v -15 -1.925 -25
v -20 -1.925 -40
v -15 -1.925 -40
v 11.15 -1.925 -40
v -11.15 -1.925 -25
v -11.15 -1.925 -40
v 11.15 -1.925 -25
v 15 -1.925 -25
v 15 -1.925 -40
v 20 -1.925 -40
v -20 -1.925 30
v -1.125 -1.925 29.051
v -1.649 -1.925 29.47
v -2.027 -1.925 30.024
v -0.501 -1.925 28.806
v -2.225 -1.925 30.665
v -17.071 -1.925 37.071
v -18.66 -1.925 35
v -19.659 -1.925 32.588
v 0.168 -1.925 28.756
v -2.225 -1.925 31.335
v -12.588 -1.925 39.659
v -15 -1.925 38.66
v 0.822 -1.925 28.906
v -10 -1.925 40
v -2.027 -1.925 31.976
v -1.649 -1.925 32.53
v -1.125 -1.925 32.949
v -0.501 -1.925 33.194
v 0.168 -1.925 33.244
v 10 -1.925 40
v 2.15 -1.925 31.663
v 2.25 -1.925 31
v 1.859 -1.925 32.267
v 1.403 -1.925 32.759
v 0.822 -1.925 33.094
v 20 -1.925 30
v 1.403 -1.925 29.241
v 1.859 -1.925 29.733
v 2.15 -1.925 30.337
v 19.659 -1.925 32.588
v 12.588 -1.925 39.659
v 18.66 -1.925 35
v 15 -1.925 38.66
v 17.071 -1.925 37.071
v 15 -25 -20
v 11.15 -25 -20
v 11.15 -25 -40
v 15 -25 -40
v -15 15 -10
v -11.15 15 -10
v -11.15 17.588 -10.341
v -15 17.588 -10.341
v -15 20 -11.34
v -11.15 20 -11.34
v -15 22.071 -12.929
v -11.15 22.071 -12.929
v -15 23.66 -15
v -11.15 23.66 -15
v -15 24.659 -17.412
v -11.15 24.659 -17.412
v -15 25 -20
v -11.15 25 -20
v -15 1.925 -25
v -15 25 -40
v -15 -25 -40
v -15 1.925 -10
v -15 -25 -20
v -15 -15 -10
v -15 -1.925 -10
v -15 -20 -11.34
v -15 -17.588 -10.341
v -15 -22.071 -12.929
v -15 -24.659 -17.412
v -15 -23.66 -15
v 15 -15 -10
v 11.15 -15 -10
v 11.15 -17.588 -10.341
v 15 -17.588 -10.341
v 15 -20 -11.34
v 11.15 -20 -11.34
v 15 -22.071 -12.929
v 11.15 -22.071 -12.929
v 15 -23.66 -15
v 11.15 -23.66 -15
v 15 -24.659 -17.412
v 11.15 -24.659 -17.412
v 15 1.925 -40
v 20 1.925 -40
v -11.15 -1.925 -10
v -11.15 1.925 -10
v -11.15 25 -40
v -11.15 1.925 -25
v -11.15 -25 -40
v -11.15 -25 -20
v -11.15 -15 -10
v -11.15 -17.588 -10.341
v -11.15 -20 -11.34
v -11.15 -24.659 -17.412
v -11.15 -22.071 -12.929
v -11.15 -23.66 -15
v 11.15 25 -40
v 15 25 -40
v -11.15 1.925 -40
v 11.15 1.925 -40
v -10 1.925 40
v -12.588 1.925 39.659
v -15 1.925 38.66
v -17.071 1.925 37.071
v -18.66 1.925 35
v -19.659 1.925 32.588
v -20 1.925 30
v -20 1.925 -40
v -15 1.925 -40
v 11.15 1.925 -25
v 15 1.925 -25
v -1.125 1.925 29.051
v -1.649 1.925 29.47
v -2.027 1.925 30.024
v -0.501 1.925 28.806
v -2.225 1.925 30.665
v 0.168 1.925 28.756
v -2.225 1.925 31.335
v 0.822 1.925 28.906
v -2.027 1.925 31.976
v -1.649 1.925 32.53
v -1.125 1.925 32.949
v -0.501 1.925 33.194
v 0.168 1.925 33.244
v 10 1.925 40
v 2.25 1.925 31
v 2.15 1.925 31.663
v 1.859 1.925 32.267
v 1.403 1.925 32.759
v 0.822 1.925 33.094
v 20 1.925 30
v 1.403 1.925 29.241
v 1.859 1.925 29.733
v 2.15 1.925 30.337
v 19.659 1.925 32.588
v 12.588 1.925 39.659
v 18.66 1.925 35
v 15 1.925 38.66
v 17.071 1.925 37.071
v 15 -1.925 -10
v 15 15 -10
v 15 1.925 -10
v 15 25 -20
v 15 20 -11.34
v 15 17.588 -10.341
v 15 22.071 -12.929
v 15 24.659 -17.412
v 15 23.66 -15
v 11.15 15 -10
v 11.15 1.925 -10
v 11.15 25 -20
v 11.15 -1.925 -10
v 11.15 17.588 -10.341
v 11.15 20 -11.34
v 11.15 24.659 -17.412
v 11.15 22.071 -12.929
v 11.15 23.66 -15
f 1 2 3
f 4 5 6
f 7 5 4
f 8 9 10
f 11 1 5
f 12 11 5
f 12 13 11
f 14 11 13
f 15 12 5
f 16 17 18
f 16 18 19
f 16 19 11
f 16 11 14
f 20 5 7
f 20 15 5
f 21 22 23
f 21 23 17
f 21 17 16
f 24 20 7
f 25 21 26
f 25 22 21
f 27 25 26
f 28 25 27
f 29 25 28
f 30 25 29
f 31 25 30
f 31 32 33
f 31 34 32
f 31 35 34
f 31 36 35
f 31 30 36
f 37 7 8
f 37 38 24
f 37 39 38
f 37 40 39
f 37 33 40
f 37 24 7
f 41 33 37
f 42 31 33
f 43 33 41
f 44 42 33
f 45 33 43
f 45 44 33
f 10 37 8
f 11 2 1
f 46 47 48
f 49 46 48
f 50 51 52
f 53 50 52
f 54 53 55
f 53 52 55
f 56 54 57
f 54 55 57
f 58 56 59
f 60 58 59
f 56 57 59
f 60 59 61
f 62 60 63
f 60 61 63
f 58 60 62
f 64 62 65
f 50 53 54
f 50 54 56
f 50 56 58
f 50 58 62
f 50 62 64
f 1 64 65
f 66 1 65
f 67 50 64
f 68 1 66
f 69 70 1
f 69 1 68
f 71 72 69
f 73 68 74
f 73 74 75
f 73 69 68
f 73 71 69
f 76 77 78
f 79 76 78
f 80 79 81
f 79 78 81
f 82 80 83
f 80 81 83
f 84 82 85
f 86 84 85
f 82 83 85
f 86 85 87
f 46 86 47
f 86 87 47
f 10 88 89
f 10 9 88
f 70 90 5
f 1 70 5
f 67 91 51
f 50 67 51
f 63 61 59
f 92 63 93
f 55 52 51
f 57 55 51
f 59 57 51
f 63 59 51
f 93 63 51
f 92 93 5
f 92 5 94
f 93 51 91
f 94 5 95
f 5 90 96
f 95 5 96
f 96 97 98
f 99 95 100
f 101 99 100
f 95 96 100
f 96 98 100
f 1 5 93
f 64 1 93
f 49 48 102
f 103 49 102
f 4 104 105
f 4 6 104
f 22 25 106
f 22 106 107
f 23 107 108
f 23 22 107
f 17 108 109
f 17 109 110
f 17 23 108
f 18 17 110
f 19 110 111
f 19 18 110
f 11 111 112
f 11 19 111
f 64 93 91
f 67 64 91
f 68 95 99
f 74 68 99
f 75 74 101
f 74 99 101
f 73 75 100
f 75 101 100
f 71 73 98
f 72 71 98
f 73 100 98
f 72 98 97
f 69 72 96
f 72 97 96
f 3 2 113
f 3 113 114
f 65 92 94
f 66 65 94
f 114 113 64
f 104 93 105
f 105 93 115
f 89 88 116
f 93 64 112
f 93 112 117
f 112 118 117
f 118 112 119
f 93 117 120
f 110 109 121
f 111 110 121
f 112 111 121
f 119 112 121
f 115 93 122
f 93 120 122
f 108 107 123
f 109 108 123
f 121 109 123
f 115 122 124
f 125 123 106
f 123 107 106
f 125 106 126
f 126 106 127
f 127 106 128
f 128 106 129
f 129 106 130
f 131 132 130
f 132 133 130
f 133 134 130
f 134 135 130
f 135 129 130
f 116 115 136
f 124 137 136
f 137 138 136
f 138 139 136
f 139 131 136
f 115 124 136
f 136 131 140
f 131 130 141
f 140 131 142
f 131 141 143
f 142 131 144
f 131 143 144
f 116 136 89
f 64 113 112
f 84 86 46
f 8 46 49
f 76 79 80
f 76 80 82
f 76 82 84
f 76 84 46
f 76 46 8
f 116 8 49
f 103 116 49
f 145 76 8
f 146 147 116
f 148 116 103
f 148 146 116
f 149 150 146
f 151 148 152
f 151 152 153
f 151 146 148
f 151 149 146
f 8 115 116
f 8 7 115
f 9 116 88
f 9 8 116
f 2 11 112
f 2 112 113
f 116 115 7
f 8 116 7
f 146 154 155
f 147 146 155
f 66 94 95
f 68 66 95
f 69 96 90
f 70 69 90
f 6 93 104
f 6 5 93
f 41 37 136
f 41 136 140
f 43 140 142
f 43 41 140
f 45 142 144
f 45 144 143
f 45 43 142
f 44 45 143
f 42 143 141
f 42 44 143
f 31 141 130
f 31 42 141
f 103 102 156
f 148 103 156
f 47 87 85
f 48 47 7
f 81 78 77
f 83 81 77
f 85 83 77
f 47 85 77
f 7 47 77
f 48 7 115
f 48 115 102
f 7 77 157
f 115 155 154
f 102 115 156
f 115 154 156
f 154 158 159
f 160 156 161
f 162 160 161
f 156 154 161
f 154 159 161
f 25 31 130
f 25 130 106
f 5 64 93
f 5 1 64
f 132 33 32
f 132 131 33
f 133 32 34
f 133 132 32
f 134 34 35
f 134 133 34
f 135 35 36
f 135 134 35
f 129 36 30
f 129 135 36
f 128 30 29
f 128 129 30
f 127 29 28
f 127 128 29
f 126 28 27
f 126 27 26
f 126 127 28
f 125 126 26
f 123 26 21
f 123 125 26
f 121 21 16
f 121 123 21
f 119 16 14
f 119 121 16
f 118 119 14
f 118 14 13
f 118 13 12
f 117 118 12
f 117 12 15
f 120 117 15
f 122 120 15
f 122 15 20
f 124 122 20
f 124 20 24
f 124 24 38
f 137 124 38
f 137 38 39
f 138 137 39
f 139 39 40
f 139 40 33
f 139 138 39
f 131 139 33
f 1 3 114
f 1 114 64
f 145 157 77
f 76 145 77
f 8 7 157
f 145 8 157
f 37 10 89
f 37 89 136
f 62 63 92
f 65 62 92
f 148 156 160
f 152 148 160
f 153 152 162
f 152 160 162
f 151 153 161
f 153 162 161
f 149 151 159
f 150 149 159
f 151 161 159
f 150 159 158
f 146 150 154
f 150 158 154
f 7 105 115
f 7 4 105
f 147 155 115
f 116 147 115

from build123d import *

# Parameters (mm, degrees)
F0_R     = 2.25
F1_DEPTH = 1.925
F5_DEPTH = 3.85
F6_DEPTH = 3.85


with BuildPart() as f1:
    # F0 (on Front) → F1 (new body, symmetric)
    with BuildSketch(Plane.XZ):
        with BuildLine():
            Line((15, -40), (20, -40))
            Line((20, -40), (20, 30))
            ThreePointArc((20, 30), (17.071068, 37.071068), (10, 40))
            Line((10, 40), (-10, 40))
            ThreePointArc((-10, 40), (-17.071068, 37.071068), (-20, 30))
            Line((-20, 30), (-20, -40))
            Line((-20, -40), (-15, -40))
            Line((-15, -40), (-15, -25))
            Line((-15, -25), (-11.15, -25))
            Line((-11.15, -25), (-11.15, -40))
            Line((-11.15, -40), (11.15, -40))
            Line((11.15, -40), (11.15, -25))
            Line((11.15, -25), (15, -25))
            Line((15, -25), (15, -40))
        make_face()
        with Locations((0, 31)):
            Circle(F0_R, mode=Mode.SUBTRACT)
    extrude(amount=F1_DEPTH, both=True)


with BuildPart() as f5:
    # F3 (on face) → F5 (new body, through all)
    with BuildSketch(Plane(origin=(-11.15, 0, 0), x_dir=(0, -1, 0), z_dir=(-1, 0, 0))):
        with BuildLine():
            Line((-25, -20), (-25, -40))
            Line((-25, -40), (-1.925, -40))
            Line((-1.925, -40), (1.925, -40))
            Line((1.925, -40), (25, -40))
            Line((25, -40), (25, -20))
            ThreePointArc((25, -20), (22.071068, -12.928932), (15, -10))
            Line((15, -10), (1.925, -10))
            Line((1.925, -10), (1.925, -25))
            Line((1.925, -25), (-1.925, -25))
            Line((-1.925, -25), (-1.925, -10))
            Line((-1.925, -10), (-15, -10))
            ThreePointArc((-15, -10), (-22.071068, -12.928932), (-25, -20))
        make_face()
    extrude(amount=F5_DEPTH)


with BuildPart() as f6:
    # F4 (on face) → F6 (new body, through all)
    with BuildSketch(Plane.YZ.offset(11.15)):
        with BuildLine():
            Line((1.925, -40), (25, -40))
            Line((25, -40), (25, -20))
            ThreePointArc((25, -20), (22.071068, -12.928932), (15, -10))
            Line((15, -10), (1.925, -10))
            Line((1.925, -10), (1.925, -25))
            Line((1.925, -25), (-1.925, -25))
            Line((-1.925, -25), (-1.925, -10))
            Line((-1.925, -10), (-15, -10))
            ThreePointArc((-15, -10), (-22.071068, -12.928932), (-25, -20))
            Line((-25, -20), (-25, -40))
            Line((-25, -40), (-1.925, -40))
            Line((-1.925, -40), (1.925, -40))
        make_face()
    extrude(amount=F6_DEPTH)


solid = Compound([f1.part, f5.part, f6.part])
